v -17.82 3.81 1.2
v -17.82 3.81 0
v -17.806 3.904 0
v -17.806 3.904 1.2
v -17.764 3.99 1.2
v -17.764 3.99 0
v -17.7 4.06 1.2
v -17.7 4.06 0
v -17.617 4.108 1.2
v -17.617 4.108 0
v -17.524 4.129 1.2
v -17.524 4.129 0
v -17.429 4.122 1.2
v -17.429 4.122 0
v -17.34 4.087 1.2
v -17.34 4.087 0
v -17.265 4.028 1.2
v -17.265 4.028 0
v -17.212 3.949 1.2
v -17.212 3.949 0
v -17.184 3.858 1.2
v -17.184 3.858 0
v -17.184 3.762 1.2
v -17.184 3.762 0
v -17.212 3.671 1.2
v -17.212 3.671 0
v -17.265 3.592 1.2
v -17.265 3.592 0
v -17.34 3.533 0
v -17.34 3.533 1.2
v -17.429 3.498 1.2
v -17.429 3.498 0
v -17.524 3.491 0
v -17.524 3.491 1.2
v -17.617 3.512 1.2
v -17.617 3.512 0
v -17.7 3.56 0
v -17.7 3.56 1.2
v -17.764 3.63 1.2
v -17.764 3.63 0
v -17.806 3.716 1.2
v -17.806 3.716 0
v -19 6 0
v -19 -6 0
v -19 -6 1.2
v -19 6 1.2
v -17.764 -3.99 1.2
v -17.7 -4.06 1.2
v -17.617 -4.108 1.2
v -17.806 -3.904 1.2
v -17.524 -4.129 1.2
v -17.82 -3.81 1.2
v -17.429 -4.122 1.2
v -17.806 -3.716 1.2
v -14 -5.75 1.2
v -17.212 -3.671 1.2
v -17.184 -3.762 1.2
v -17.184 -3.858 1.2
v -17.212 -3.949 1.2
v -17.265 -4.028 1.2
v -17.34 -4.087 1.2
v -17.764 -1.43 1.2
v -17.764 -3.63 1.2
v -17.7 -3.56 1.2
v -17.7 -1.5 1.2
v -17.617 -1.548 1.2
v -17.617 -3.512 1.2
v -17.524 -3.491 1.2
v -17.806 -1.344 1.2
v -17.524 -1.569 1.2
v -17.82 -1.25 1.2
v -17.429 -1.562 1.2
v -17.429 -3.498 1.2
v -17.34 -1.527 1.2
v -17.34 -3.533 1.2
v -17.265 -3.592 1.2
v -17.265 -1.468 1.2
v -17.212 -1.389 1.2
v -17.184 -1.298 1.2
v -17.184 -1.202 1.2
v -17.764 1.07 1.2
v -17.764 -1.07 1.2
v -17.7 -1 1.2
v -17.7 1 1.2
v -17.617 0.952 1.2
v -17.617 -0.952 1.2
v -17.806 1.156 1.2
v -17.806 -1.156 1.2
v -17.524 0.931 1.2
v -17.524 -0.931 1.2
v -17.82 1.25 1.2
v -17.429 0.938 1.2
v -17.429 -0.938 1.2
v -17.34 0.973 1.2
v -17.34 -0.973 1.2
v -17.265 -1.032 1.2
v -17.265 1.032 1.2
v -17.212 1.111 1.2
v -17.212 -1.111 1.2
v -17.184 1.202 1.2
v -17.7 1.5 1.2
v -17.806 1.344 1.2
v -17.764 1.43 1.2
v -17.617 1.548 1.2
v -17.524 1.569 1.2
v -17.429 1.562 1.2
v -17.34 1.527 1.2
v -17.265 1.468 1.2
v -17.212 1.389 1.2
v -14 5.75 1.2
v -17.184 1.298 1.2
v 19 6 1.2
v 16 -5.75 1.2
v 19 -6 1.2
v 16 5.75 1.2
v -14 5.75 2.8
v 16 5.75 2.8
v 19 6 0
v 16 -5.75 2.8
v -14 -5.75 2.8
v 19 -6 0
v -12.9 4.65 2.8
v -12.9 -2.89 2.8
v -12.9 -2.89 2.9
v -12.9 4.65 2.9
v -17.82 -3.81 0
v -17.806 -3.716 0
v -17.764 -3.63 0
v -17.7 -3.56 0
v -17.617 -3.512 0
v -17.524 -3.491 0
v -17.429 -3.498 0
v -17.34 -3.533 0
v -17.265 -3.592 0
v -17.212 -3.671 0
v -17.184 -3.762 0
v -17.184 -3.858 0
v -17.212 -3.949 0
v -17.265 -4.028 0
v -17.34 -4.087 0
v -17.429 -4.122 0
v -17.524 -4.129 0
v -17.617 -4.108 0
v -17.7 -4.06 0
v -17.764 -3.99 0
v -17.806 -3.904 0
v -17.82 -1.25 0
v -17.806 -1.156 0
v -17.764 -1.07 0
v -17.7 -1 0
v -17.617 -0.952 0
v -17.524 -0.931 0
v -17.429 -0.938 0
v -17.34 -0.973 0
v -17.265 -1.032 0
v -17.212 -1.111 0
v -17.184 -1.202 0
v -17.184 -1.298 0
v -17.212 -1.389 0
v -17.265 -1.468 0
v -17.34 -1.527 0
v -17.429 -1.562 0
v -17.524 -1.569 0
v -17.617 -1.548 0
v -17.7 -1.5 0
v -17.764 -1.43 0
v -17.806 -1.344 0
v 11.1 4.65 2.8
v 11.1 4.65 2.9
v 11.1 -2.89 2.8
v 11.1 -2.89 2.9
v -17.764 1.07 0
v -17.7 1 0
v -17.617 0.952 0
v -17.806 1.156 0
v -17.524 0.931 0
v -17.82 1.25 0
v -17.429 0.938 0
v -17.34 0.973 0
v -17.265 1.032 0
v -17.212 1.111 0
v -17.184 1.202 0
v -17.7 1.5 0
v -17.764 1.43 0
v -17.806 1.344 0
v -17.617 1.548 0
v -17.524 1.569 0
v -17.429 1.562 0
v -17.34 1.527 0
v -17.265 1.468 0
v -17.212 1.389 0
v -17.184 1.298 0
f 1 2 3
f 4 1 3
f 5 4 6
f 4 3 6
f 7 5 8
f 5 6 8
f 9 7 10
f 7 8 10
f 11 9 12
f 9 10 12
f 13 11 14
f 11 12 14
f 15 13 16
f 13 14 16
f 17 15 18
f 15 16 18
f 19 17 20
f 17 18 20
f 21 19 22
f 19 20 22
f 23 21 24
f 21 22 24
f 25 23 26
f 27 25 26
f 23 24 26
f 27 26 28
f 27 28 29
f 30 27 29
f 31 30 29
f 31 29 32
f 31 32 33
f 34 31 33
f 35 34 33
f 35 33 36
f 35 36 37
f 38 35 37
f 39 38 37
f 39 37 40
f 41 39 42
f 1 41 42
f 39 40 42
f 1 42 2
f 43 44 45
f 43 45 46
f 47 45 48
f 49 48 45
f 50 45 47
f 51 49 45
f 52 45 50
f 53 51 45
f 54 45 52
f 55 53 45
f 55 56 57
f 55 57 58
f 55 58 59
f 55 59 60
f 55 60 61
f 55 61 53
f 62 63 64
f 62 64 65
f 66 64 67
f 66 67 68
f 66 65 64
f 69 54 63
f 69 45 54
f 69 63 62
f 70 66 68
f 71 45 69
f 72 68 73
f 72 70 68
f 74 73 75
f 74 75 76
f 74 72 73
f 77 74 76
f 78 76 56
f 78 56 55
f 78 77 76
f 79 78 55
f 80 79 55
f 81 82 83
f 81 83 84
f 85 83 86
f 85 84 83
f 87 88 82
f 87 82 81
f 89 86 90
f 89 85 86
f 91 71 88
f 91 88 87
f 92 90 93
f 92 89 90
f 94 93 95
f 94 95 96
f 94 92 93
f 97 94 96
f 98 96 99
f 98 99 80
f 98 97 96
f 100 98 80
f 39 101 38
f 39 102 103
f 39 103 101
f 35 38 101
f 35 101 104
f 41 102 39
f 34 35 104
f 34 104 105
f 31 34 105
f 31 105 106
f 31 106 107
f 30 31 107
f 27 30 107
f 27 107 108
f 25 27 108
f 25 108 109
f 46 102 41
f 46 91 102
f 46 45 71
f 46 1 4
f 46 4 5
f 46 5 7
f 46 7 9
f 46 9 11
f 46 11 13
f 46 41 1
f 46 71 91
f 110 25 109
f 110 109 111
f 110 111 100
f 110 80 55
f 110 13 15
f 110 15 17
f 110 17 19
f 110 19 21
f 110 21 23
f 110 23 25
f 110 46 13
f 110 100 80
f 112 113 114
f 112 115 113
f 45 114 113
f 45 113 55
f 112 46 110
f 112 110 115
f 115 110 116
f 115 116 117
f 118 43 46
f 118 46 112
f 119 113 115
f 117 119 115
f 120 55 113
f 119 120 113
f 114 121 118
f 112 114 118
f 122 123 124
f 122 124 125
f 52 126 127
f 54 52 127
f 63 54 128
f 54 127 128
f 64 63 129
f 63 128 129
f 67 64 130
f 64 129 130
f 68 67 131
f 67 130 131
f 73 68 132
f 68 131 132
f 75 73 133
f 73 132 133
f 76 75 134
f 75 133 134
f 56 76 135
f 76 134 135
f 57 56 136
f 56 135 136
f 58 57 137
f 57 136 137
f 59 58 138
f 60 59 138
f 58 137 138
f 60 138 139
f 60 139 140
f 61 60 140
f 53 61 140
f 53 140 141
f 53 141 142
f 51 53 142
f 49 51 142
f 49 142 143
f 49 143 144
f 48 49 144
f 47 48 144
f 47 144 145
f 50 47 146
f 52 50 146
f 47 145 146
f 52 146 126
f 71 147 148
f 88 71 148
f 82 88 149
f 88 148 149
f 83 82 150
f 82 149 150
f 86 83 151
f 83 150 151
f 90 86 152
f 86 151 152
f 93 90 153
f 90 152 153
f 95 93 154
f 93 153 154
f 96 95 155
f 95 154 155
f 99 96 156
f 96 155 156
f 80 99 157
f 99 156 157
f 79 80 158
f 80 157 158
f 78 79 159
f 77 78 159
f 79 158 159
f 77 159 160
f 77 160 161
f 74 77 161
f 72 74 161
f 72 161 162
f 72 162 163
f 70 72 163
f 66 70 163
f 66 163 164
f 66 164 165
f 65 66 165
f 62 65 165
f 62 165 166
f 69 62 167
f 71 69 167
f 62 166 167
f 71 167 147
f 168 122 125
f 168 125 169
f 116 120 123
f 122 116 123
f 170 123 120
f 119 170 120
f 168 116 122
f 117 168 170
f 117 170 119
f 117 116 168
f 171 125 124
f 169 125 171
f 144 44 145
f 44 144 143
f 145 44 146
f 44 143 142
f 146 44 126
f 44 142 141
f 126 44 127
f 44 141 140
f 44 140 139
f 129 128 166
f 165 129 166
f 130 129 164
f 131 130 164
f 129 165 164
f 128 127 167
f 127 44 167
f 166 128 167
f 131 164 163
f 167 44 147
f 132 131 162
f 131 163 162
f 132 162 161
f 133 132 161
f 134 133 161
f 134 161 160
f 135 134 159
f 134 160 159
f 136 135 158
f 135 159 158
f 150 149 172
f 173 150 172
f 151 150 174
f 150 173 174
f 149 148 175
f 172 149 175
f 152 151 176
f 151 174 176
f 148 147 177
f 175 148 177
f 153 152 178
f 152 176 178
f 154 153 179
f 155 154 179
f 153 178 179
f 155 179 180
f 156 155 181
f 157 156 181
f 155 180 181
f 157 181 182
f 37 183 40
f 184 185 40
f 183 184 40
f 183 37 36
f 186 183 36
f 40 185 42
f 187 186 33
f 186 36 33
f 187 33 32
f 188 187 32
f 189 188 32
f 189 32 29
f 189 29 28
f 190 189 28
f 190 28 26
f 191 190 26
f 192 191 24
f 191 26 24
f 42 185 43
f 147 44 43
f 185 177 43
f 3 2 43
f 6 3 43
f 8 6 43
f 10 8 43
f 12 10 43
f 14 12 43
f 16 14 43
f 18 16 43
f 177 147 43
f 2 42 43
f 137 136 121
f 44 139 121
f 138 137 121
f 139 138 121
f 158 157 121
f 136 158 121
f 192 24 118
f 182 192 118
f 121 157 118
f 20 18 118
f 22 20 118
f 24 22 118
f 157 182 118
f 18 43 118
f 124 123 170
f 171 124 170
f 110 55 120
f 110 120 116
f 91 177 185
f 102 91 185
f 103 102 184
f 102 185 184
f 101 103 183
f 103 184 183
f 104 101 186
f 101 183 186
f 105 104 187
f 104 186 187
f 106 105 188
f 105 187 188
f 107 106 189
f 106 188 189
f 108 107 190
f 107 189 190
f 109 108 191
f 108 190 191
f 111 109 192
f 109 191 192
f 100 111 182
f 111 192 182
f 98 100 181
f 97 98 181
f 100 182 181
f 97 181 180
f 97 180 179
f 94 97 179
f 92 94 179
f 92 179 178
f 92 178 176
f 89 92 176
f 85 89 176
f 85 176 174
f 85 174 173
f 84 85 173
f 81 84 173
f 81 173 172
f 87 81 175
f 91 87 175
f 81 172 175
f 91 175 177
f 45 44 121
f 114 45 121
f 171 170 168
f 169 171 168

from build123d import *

# Parameters (mm, degrees)
SKETCH1_W           = 38
SKETCH1_H           = 12
BOSS_EXTRUDE1_DEPTH = 1.2
SKETCH2_W           = 30
SKETCH2_H           = 11.5
BOSS_EXTRUDE2_DEPTH = 1.6
SKETCH4_W           = 24
SKETCH4_H           = 7.54
BOSS_EXTRUDE6_DEPTH = 0.1
SKETCH5_R           = 0.32
CUT_EXTRUDE1_DEPTH  = 1.2


with BuildPart() as part:
    # Sketch1 → Boss-Extrude1 (new body)
    with BuildSketch(Plane.XY):
        Rectangle(SKETCH1_W, SKETCH1_H)
    extrude(amount=BOSS_EXTRUDE1_DEPTH)

    # Sketch2 → Boss-Extrude2 (add)
    with BuildSketch(Plane.XY.offset(1.2)):
        with Locations((1, 0)):
            Rectangle(SKETCH2_W, SKETCH2_H)
    extrude(amount=BOSS_EXTRUDE2_DEPTH)

    # Sketch4 → Boss-Extrude6 (add)
    with BuildSketch(Plane.XY.offset(2.8)):
        with Locations((-0.9, 0.88)):
            Rectangle(SKETCH4_W, SKETCH4_H)
    extrude(amount=BOSS_EXTRUDE6_DEPTH)

    # Sketch5 → Cut-Extrude1 (cut)
    with BuildSketch(Plane(origin=(0, 0, 0), x_dir=(-1, 0, 0), z_dir=(0, 0, -1))):
        with Locations((17.5, 3.81)):
            Circle(SKETCH5_R)
        with Locations((17.5, 1.25)):
            Circle(SKETCH5_R)
        with Locations((17.5, -1.25)):
            Circle(SKETCH5_R)
        with Locations((17.5, -3.81)):
            Circle(SKETCH5_R)
    extrude(amount=-CUT_EXTRUDE1_DEPTH, mode=Mode.SUBTRACT)


solid = part.part
